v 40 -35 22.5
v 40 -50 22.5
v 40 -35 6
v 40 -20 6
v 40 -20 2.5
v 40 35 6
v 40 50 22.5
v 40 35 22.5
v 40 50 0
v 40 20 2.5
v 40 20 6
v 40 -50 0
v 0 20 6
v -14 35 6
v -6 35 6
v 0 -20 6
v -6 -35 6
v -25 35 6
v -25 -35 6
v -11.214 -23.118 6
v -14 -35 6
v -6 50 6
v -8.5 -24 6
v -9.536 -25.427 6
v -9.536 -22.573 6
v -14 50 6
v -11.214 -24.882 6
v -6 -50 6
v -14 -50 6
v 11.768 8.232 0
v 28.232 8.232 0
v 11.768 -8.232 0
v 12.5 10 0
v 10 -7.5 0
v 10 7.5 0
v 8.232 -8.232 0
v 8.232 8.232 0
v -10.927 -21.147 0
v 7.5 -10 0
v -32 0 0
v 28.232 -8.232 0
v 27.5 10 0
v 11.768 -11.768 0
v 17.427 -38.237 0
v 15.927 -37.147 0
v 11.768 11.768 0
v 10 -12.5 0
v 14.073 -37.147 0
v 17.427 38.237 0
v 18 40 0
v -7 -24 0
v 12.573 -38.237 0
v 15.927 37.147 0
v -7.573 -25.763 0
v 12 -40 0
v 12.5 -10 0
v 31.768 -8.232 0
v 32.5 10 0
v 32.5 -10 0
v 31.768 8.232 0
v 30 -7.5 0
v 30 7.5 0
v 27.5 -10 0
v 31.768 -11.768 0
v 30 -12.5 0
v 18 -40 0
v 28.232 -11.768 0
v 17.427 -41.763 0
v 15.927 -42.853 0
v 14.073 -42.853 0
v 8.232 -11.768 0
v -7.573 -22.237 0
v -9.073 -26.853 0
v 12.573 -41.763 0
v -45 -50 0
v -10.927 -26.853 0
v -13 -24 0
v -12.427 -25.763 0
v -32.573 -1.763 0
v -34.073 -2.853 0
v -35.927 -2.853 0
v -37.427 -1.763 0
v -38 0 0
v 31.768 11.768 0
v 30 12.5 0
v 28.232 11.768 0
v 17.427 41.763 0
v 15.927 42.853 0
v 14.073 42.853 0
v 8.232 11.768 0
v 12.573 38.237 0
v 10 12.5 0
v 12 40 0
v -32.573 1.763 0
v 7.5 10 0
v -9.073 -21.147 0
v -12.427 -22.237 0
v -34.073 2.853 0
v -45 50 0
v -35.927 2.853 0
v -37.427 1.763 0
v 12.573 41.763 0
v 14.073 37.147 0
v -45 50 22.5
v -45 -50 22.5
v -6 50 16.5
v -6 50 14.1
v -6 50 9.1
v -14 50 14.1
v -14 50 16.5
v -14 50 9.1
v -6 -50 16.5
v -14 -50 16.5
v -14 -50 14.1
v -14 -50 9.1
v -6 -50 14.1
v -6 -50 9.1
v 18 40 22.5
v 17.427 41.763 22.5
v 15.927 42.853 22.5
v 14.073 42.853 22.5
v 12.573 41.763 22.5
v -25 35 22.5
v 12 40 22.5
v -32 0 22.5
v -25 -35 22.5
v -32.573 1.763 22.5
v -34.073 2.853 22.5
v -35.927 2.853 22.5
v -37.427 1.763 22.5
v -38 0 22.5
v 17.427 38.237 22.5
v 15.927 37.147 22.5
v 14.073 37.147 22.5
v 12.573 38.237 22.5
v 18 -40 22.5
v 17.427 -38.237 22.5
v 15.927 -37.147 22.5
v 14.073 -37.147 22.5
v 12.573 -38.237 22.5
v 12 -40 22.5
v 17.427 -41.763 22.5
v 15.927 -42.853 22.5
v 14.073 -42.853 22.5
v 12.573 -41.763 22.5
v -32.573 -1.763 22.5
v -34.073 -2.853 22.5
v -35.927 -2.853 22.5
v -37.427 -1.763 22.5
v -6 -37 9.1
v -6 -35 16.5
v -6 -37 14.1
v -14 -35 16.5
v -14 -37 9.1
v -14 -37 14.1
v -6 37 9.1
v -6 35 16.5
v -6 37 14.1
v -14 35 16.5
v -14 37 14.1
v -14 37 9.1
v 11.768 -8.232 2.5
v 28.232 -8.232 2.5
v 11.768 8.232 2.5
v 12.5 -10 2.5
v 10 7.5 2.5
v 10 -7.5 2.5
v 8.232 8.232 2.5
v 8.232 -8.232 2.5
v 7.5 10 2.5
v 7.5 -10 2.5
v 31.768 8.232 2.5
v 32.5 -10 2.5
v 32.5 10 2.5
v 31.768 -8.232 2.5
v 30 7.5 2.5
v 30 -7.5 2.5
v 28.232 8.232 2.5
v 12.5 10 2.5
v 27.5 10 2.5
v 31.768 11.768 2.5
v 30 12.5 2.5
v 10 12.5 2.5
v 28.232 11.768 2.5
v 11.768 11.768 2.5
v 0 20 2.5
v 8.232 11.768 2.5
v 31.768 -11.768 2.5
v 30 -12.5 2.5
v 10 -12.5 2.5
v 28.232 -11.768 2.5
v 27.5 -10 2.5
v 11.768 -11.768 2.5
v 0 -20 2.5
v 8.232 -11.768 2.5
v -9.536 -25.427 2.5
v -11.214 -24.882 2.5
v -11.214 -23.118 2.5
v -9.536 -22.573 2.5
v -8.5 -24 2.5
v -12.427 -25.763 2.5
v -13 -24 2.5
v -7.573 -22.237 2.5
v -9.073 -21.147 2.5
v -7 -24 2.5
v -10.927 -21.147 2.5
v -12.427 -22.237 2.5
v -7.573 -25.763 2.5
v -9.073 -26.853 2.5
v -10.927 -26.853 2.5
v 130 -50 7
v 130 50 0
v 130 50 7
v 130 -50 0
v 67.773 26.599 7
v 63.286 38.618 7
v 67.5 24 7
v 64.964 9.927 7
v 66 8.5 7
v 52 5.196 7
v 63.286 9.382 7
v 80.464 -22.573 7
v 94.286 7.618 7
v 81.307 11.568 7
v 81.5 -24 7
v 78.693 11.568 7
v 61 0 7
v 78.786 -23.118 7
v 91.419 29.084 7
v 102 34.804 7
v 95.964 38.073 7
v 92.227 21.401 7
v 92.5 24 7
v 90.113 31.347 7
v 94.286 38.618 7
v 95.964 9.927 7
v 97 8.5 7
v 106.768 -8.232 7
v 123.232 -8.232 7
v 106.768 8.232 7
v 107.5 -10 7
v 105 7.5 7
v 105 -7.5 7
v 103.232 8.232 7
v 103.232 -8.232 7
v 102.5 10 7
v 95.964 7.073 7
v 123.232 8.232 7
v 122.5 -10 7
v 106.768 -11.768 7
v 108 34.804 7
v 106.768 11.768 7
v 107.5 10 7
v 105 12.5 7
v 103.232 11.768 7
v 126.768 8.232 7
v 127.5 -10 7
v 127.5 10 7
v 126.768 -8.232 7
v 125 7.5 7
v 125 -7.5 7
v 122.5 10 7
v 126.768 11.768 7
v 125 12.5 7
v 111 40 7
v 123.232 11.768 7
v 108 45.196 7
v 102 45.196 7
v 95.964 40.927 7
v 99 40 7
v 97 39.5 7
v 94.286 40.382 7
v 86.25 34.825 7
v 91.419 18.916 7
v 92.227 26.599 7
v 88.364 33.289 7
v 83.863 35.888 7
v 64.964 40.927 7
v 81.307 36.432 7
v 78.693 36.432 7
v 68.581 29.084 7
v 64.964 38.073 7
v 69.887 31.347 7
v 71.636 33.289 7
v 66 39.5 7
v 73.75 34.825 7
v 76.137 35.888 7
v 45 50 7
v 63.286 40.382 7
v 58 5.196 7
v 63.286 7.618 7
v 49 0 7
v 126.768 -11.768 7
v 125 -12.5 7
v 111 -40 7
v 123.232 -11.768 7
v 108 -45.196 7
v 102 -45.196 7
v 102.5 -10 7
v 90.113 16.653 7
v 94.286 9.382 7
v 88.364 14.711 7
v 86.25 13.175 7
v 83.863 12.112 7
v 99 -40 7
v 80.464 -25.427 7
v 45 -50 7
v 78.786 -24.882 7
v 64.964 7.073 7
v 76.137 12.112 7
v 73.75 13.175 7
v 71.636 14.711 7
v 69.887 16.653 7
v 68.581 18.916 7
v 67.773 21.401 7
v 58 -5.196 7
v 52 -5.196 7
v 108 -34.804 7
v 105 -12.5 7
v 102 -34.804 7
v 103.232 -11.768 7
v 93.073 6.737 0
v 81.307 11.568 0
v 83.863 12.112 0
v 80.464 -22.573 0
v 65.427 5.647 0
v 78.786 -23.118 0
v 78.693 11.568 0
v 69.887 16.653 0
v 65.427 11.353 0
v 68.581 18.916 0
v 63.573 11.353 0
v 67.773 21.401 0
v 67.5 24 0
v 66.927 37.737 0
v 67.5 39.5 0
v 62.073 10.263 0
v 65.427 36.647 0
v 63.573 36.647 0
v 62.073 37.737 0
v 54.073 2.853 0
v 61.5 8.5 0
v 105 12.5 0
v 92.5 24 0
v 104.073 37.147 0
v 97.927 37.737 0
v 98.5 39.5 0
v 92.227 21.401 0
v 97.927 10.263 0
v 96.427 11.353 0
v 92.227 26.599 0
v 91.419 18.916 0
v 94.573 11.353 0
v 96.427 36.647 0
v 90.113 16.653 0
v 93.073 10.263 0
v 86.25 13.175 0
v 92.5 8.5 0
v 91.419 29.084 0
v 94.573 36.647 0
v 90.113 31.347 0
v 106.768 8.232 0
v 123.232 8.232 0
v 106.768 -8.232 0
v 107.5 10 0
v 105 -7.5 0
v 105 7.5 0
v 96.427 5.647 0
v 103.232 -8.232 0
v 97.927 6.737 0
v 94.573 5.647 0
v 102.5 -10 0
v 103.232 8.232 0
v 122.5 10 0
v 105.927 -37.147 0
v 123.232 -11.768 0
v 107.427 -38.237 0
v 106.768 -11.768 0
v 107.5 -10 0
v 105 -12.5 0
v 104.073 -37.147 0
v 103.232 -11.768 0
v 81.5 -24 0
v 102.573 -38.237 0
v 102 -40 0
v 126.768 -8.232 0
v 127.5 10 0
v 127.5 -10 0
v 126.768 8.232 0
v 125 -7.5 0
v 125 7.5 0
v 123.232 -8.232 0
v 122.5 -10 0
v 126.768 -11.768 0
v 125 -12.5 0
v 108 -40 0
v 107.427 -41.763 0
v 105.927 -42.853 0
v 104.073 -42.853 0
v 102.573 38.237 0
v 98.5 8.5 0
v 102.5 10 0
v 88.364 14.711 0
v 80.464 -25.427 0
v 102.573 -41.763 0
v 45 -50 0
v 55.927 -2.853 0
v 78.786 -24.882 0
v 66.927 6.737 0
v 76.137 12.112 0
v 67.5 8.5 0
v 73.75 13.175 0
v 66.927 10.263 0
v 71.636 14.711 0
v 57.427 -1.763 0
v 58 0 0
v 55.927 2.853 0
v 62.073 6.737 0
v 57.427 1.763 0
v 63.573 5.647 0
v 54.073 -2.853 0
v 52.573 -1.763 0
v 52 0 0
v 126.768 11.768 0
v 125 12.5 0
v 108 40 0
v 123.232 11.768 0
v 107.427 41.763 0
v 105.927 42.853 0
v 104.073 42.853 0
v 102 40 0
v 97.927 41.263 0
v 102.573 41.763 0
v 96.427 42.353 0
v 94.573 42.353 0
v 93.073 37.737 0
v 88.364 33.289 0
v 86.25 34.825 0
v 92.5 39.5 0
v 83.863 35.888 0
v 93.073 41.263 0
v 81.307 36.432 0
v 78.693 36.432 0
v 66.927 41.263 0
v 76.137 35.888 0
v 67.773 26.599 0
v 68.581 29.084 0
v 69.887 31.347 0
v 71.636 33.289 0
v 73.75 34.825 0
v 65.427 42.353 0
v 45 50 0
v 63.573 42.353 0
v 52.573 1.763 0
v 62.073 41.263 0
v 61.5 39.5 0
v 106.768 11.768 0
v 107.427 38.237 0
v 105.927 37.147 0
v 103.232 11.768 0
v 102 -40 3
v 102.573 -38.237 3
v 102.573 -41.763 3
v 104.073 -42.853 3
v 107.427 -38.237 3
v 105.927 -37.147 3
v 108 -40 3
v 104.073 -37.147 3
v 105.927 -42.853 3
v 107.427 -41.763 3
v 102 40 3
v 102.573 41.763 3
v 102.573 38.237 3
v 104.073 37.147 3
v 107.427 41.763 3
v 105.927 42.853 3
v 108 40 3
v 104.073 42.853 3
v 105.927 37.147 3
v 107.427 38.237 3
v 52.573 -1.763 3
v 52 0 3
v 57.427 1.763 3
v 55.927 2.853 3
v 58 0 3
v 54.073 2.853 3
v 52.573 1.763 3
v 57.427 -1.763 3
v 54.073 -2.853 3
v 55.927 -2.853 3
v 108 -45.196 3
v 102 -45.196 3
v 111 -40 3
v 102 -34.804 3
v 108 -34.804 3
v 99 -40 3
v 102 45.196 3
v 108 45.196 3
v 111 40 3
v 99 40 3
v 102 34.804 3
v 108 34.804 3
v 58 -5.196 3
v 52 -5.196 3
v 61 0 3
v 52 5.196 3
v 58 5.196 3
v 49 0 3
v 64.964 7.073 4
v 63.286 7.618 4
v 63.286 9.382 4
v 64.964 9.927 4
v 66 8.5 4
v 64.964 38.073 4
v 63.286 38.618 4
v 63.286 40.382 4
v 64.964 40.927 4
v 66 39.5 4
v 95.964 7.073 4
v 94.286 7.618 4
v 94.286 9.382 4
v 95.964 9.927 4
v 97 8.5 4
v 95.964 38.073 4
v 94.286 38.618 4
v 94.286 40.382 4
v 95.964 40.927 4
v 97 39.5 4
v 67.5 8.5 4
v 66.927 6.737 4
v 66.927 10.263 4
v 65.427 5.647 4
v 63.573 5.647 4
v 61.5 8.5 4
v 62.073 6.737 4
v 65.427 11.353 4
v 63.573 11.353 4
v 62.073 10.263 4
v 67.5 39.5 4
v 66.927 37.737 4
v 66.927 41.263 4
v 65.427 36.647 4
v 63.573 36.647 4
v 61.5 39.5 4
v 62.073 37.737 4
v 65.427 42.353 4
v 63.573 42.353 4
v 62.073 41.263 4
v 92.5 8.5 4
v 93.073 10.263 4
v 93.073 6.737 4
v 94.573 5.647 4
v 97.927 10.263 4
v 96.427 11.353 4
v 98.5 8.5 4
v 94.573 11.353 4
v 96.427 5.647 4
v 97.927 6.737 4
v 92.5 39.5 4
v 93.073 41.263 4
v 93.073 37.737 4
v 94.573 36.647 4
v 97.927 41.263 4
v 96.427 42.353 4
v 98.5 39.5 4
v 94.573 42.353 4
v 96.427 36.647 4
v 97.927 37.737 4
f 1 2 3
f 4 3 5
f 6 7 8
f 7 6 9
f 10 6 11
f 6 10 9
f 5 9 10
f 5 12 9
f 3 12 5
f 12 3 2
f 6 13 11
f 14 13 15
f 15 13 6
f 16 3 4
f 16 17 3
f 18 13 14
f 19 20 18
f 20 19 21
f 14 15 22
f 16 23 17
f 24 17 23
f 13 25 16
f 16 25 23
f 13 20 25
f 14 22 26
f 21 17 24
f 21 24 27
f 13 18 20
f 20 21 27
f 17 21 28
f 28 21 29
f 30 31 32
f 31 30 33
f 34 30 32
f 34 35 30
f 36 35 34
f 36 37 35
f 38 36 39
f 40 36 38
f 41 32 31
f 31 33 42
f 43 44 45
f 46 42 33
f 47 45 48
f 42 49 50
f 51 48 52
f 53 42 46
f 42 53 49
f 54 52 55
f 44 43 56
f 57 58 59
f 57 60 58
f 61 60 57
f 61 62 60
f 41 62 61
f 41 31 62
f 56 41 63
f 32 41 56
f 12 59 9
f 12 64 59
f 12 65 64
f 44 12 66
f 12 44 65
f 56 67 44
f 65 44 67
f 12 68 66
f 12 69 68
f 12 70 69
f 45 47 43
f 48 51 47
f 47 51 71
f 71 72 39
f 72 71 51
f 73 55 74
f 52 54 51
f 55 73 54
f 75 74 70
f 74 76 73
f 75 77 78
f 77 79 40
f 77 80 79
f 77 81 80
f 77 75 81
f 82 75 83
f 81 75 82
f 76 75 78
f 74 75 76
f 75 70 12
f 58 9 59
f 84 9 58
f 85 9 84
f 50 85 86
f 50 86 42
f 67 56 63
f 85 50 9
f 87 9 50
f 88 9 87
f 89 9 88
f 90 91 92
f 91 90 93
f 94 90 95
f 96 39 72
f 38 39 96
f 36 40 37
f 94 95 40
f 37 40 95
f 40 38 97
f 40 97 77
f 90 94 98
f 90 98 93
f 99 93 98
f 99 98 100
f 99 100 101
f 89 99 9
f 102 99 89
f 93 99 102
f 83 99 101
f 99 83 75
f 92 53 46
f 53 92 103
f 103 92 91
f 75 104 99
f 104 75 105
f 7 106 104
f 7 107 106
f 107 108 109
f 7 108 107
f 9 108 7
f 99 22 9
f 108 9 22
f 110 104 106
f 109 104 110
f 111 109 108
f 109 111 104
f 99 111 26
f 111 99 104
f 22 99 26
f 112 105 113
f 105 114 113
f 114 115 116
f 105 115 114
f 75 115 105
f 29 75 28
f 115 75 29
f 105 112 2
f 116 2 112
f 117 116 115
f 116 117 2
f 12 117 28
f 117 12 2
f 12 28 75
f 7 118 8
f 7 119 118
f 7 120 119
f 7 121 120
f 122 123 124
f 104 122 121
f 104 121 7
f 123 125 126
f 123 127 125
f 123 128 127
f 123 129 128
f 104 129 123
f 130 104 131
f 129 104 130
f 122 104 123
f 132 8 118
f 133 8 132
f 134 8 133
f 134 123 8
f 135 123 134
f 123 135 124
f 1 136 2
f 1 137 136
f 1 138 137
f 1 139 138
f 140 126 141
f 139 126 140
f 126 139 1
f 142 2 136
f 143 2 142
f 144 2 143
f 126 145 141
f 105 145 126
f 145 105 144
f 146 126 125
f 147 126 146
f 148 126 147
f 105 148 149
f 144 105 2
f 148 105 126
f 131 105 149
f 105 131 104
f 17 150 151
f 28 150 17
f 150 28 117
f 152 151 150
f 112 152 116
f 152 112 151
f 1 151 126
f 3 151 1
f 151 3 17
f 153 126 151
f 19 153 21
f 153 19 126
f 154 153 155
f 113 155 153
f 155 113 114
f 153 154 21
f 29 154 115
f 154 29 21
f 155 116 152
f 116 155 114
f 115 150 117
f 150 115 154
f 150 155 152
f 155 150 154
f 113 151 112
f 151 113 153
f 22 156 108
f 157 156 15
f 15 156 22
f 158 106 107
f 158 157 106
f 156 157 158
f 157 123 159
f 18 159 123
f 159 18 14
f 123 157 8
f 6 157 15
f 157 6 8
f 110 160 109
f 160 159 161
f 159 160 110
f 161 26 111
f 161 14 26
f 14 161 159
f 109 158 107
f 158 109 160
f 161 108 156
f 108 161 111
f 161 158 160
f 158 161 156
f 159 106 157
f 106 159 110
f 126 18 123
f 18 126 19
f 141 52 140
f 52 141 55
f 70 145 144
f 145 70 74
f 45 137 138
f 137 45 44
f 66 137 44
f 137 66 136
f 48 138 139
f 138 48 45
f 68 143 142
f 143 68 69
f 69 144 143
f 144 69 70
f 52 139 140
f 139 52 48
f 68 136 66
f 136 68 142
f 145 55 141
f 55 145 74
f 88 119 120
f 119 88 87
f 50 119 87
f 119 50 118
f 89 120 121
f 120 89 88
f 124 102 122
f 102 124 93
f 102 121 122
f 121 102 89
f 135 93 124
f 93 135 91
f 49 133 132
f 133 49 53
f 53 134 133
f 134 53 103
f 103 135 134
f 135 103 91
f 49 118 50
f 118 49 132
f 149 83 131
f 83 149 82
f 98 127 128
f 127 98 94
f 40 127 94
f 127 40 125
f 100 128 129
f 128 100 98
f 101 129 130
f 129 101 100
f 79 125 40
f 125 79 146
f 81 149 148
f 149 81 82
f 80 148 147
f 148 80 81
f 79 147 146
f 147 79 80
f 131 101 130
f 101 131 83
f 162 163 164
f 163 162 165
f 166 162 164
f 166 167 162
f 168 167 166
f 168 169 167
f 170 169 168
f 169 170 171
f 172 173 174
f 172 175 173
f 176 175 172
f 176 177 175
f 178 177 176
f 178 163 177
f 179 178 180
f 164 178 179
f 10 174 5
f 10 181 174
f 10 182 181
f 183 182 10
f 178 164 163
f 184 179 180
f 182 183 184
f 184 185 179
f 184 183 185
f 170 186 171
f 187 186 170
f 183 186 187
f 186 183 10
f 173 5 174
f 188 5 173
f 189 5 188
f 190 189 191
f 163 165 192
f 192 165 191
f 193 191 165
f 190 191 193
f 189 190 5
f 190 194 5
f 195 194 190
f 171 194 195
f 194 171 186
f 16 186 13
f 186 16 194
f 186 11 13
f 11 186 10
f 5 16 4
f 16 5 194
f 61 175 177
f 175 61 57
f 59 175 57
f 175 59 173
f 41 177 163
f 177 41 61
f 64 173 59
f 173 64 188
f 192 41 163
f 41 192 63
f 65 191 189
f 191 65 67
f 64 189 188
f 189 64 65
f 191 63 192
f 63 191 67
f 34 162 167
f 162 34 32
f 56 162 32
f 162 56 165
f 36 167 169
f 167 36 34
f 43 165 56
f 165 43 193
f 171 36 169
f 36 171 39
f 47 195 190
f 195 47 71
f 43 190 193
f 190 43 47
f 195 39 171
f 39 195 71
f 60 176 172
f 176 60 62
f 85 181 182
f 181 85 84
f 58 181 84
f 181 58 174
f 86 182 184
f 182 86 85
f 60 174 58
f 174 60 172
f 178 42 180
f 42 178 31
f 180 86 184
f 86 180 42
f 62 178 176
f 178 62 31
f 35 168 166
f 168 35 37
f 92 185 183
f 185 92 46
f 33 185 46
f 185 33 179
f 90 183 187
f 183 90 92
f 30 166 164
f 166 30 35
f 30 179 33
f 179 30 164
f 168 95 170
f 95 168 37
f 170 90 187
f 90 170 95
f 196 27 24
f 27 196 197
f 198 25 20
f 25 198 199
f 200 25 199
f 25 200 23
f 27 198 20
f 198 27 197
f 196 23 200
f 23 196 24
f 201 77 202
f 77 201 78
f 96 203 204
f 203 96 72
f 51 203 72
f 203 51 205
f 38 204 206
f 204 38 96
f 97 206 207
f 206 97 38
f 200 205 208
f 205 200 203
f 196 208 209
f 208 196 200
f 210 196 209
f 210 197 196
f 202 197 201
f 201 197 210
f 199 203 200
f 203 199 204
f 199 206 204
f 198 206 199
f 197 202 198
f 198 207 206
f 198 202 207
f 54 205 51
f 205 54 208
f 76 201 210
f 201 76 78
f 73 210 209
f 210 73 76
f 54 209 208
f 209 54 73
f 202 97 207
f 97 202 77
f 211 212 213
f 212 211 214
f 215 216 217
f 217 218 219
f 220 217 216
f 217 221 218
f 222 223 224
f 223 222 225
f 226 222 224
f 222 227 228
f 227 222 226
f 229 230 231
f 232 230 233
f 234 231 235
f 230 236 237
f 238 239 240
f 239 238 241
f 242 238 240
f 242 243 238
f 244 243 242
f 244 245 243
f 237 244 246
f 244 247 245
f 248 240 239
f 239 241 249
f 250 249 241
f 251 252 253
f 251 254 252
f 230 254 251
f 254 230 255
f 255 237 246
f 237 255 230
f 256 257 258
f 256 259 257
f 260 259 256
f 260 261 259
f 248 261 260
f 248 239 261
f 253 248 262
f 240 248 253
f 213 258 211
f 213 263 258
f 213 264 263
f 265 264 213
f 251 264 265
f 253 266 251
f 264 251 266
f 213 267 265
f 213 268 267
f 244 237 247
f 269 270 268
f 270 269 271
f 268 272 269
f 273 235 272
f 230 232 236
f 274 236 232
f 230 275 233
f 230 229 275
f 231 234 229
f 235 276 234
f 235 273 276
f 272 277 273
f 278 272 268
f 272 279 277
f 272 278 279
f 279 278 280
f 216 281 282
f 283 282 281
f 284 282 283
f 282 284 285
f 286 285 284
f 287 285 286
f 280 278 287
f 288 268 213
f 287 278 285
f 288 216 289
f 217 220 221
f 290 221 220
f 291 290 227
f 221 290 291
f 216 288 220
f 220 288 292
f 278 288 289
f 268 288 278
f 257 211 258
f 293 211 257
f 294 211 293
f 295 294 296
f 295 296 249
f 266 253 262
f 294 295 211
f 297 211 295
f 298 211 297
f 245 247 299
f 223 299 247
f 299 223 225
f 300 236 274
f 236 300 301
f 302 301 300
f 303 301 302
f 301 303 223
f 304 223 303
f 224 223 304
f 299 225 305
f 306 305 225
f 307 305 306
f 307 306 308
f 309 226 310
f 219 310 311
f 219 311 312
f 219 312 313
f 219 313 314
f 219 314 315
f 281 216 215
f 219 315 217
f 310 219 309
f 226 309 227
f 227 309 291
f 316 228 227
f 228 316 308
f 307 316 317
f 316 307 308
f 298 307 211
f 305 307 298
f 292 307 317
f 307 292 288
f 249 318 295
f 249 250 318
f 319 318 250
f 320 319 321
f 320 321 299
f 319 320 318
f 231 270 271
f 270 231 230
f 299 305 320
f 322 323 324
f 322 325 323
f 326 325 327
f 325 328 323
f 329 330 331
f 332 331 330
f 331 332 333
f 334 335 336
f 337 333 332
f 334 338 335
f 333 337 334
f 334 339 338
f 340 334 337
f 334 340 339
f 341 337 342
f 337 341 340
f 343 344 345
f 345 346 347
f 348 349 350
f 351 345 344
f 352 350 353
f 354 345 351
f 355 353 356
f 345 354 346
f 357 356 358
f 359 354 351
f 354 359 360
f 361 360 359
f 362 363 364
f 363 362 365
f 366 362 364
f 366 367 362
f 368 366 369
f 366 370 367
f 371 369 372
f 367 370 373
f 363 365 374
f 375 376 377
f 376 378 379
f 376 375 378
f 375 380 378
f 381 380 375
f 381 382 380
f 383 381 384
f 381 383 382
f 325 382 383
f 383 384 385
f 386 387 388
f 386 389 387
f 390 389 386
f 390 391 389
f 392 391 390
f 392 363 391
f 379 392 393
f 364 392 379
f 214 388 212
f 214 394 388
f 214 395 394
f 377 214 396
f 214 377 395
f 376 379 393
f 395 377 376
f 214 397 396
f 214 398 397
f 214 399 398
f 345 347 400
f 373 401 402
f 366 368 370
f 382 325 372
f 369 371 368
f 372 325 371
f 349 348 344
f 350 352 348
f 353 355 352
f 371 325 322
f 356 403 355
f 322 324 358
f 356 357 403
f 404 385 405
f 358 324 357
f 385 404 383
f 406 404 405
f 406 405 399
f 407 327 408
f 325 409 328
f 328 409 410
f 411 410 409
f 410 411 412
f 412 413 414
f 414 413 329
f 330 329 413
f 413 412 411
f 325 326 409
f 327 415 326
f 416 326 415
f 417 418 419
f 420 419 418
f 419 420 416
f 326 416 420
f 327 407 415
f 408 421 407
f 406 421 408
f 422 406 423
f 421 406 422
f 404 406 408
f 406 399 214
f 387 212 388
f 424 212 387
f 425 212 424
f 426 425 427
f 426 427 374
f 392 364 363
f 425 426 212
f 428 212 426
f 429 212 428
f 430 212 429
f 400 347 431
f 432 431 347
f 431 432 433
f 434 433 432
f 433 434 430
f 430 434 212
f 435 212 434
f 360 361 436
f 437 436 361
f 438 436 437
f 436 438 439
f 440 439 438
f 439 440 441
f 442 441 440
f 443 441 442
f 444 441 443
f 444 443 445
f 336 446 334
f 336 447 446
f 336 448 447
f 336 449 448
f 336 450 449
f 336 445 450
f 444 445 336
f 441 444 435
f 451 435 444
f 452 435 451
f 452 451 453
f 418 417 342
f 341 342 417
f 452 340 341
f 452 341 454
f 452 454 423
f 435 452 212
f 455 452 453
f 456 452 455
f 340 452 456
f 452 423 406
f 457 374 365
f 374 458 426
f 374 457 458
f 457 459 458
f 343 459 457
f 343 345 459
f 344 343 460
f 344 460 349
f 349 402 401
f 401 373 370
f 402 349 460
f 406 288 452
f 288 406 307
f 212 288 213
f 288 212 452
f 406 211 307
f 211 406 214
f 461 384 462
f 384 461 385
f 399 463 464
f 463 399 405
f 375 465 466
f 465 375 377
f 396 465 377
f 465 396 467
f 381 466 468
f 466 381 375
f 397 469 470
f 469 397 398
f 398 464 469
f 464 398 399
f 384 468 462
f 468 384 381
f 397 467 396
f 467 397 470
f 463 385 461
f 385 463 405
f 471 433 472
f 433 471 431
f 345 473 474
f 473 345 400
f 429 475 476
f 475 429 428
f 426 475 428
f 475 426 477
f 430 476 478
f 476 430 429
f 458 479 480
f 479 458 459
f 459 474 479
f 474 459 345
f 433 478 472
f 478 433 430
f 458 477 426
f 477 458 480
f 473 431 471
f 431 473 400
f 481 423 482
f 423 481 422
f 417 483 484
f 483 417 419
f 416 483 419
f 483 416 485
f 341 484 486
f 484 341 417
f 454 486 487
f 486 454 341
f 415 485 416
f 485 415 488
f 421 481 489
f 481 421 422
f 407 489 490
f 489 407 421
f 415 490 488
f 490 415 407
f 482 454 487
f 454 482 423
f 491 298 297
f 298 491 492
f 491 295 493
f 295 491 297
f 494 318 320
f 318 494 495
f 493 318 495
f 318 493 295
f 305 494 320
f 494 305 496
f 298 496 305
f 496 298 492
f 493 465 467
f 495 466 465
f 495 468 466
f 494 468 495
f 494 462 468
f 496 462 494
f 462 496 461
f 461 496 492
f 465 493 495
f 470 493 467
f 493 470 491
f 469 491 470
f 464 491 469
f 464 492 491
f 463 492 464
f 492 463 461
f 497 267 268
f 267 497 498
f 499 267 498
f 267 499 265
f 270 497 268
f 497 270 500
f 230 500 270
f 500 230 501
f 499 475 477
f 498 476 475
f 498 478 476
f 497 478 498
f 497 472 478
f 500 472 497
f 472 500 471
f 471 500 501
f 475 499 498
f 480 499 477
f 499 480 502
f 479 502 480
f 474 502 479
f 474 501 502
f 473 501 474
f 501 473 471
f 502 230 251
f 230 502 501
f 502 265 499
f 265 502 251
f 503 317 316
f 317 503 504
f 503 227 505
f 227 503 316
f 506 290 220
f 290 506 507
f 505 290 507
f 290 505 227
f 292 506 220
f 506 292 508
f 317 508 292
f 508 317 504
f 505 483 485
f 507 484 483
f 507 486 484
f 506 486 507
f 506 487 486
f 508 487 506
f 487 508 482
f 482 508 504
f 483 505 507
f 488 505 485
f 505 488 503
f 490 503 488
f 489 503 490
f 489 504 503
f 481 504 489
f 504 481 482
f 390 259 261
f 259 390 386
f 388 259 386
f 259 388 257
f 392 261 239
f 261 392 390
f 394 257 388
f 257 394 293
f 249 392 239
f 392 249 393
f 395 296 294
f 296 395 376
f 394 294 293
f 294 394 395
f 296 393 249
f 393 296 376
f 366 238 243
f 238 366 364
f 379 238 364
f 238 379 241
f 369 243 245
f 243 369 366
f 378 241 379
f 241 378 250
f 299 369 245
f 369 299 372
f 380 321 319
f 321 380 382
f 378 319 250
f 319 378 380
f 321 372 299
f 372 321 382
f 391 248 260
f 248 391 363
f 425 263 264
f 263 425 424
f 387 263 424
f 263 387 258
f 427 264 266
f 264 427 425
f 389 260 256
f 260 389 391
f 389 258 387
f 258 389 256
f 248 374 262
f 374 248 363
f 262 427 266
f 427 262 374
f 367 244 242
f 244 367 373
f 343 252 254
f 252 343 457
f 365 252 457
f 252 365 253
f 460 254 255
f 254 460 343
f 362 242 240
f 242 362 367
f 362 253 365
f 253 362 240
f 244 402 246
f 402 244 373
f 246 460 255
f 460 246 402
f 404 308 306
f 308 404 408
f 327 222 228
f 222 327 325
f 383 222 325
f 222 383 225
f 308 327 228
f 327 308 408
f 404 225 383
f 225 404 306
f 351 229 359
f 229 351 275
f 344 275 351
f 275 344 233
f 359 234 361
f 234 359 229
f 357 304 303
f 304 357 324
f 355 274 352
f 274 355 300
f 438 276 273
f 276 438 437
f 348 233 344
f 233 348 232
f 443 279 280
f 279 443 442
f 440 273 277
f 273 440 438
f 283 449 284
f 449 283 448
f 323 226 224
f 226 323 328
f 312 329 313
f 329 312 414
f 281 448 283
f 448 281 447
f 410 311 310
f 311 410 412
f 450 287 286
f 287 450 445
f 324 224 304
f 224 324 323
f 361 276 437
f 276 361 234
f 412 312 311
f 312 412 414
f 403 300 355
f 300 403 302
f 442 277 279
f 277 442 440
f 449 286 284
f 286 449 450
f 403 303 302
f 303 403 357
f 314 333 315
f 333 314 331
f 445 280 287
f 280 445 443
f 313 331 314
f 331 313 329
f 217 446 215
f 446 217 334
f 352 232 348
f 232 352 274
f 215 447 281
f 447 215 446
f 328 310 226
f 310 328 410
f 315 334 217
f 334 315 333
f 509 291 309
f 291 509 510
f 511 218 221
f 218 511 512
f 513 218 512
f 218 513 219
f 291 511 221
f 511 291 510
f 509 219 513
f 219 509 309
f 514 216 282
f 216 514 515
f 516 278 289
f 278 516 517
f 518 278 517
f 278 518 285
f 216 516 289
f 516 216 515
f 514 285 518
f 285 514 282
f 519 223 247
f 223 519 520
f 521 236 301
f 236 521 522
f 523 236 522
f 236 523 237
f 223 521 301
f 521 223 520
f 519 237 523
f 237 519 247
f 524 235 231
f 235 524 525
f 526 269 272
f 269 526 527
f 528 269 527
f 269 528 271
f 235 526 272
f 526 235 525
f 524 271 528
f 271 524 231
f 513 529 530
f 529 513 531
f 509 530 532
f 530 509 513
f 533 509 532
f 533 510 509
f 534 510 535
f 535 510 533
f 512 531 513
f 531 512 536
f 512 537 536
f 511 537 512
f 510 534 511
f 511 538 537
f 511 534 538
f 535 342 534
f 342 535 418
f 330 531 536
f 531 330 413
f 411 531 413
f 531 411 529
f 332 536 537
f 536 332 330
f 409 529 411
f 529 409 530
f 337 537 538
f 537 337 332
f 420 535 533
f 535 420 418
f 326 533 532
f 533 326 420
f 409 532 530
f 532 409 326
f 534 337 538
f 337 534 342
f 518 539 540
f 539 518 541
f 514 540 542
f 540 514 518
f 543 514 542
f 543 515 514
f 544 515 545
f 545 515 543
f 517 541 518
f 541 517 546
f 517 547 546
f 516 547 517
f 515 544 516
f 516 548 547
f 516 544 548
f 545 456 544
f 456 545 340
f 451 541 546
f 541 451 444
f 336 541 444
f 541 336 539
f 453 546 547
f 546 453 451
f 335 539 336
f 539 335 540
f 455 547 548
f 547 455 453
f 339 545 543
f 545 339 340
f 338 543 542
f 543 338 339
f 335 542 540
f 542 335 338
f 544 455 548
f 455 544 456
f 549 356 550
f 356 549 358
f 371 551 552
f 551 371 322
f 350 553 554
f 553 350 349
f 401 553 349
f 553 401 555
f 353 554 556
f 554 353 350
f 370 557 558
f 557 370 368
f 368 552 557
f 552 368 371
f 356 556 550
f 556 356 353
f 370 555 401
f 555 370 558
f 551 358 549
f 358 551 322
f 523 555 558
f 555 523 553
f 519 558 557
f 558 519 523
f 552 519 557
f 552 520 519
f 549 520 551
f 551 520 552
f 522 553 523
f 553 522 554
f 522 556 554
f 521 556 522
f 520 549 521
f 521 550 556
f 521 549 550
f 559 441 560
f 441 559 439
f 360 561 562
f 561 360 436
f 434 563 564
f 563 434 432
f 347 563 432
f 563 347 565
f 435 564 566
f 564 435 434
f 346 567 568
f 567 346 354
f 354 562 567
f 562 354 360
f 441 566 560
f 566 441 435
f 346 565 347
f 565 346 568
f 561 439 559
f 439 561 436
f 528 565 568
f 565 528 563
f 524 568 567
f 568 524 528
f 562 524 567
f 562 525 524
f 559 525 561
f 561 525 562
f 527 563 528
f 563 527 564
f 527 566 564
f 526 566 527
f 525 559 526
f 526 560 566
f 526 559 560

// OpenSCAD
// file: x-end-plate.scad
module x_end_plate(vslot_offset, belt_offset, wheel_x_offset, wheel_z_offset) {
    difference() {
        union() {
            translate([-45,-50, 12.5]) cube([85, 100, 6]);
            translate([-6,-50,12.5]) cube([46, 15, 22.5]);
            translate([-45,-50,12.5]) cube([31, 15, 22.5]);
            translate([-20,-50, belt_offset + 12.2/2 + 1.5]) cube([15, 13, 5]);
            translate([-20,-50, 29]) cube([15, 15, 6]);

            translate([-6,  35,12.5]) cube([46, 15, 22.5]);
            translate([-45, 35,12.5]) cube([31, 15, 22.5]);
            translate([-20, 37, belt_offset + 12.2/2 + 1.5]) cube([15, 13, 5]);
            translate([-20, 35, 29]) cube([15, 15, 6]);

            translate([-45,-50,12.5]) cube([20, 100, 22.5]);
	};
        translate([wheel_x_offset-10, -40, -10]) #cylinder(d=6, h=51.5);
        translate([wheel_x_offset-10, 40, -10]) #cylinder(d=6, h=51.5);
        translate([-wheel_x_offset-10, 0, -10]) #cylinder(d=6, h=51.5);
	translate([0,-20,15]) cube([100,40,20]);
        translate([30, -10, 0]) cylinder(d=5, h=20);
        translate([10, -10, 0]) cylinder(d=5, h=20);
        translate([30, 10, 0]) cylinder(d=5, h=20);
        translate([10, 10, 0]) cylinder(d=5, h=20);
        translate([-10, -24, 0]) cylinder(d=3, h=100);
        translate([-10, -24, 0]) cylinder(d=6, h=15);
    };
}

module x_end_top(vslot_offset, belt_offset, wheel_x_offset, wheel_z_offset) {
    echo("x_end offsets",vslot_offset, belt_offset, wheel_x_offset, wheel_z_offset);
    difference() {
        union() {
            translate([-45,-50, 35]) cube([85, 100, 7]);
	}
        translate([wheel_x_offset-10, -40, -10]) #cylinder(d=6, h=51.5);
        translate([wheel_x_offset-10, 40, -10]) #cylinder(d=6, h=51.5);
        translate([-wheel_x_offset-10, 0, -10]) #cylinder(d=6, h=51.5);
        translate([wheel_x_offset-10, -40, 38]) cylinder(d=12, h=10, $fn=6);
        translate([wheel_x_offset-10, 40,  38]) cylinder(d=12, h=10, $fn=6);
        translate([-wheel_x_offset-10, 0,  38]) cylinder(d=12, h=10, $fn=6);
        translate([35, -10, 30]) cylinder(d=5, h=20);
        translate([15, -10, 30]) cylinder(d=5, h=20);
        translate([35, 10, 30]) cylinder(d=5, h=20);
        translate([15, 10, 30]) cylinder(d=5, h=20);
        translate([-10, -24, 0]) cylinder(d=3, h=100);
        translate([-10, 24, 0]) cylinder(d=25, h=100);
        translate([-10-15.5, 24-15.5, 0]) cylinder(d=3, h=100);
        translate([-10-15.5, 24+15.5, 0]) cylinder(d=3, h=100);
        translate([-10+15.5, 24-15.5, 0]) cylinder(d=3, h=100);
        translate([-10+15.5, 24+15.5, 0]) cylinder(d=3, h=100);
        translate([-10-15.5, 24-15.5, 0]) cylinder(d=6, h=39);
        translate([-10-15.5, 24+15.5, 0]) cylinder(d=6, h=39);
        translate([-10+15.5, 24-15.5, 0]) cylinder(d=6, h=39);
        translate([-10+15.5, 24+15.5, 0]) cylinder(d=6, h=39);
    };
}
// main file
include <x-end-plate.scad>

translate([0,0,-12.5]) rotate([0,0,0]) x_end_plate(25, 14, 25, 3);
translate([90,0,-35]) rotate([0,0,0]) x_end_top(25, 14, 25, 3);
